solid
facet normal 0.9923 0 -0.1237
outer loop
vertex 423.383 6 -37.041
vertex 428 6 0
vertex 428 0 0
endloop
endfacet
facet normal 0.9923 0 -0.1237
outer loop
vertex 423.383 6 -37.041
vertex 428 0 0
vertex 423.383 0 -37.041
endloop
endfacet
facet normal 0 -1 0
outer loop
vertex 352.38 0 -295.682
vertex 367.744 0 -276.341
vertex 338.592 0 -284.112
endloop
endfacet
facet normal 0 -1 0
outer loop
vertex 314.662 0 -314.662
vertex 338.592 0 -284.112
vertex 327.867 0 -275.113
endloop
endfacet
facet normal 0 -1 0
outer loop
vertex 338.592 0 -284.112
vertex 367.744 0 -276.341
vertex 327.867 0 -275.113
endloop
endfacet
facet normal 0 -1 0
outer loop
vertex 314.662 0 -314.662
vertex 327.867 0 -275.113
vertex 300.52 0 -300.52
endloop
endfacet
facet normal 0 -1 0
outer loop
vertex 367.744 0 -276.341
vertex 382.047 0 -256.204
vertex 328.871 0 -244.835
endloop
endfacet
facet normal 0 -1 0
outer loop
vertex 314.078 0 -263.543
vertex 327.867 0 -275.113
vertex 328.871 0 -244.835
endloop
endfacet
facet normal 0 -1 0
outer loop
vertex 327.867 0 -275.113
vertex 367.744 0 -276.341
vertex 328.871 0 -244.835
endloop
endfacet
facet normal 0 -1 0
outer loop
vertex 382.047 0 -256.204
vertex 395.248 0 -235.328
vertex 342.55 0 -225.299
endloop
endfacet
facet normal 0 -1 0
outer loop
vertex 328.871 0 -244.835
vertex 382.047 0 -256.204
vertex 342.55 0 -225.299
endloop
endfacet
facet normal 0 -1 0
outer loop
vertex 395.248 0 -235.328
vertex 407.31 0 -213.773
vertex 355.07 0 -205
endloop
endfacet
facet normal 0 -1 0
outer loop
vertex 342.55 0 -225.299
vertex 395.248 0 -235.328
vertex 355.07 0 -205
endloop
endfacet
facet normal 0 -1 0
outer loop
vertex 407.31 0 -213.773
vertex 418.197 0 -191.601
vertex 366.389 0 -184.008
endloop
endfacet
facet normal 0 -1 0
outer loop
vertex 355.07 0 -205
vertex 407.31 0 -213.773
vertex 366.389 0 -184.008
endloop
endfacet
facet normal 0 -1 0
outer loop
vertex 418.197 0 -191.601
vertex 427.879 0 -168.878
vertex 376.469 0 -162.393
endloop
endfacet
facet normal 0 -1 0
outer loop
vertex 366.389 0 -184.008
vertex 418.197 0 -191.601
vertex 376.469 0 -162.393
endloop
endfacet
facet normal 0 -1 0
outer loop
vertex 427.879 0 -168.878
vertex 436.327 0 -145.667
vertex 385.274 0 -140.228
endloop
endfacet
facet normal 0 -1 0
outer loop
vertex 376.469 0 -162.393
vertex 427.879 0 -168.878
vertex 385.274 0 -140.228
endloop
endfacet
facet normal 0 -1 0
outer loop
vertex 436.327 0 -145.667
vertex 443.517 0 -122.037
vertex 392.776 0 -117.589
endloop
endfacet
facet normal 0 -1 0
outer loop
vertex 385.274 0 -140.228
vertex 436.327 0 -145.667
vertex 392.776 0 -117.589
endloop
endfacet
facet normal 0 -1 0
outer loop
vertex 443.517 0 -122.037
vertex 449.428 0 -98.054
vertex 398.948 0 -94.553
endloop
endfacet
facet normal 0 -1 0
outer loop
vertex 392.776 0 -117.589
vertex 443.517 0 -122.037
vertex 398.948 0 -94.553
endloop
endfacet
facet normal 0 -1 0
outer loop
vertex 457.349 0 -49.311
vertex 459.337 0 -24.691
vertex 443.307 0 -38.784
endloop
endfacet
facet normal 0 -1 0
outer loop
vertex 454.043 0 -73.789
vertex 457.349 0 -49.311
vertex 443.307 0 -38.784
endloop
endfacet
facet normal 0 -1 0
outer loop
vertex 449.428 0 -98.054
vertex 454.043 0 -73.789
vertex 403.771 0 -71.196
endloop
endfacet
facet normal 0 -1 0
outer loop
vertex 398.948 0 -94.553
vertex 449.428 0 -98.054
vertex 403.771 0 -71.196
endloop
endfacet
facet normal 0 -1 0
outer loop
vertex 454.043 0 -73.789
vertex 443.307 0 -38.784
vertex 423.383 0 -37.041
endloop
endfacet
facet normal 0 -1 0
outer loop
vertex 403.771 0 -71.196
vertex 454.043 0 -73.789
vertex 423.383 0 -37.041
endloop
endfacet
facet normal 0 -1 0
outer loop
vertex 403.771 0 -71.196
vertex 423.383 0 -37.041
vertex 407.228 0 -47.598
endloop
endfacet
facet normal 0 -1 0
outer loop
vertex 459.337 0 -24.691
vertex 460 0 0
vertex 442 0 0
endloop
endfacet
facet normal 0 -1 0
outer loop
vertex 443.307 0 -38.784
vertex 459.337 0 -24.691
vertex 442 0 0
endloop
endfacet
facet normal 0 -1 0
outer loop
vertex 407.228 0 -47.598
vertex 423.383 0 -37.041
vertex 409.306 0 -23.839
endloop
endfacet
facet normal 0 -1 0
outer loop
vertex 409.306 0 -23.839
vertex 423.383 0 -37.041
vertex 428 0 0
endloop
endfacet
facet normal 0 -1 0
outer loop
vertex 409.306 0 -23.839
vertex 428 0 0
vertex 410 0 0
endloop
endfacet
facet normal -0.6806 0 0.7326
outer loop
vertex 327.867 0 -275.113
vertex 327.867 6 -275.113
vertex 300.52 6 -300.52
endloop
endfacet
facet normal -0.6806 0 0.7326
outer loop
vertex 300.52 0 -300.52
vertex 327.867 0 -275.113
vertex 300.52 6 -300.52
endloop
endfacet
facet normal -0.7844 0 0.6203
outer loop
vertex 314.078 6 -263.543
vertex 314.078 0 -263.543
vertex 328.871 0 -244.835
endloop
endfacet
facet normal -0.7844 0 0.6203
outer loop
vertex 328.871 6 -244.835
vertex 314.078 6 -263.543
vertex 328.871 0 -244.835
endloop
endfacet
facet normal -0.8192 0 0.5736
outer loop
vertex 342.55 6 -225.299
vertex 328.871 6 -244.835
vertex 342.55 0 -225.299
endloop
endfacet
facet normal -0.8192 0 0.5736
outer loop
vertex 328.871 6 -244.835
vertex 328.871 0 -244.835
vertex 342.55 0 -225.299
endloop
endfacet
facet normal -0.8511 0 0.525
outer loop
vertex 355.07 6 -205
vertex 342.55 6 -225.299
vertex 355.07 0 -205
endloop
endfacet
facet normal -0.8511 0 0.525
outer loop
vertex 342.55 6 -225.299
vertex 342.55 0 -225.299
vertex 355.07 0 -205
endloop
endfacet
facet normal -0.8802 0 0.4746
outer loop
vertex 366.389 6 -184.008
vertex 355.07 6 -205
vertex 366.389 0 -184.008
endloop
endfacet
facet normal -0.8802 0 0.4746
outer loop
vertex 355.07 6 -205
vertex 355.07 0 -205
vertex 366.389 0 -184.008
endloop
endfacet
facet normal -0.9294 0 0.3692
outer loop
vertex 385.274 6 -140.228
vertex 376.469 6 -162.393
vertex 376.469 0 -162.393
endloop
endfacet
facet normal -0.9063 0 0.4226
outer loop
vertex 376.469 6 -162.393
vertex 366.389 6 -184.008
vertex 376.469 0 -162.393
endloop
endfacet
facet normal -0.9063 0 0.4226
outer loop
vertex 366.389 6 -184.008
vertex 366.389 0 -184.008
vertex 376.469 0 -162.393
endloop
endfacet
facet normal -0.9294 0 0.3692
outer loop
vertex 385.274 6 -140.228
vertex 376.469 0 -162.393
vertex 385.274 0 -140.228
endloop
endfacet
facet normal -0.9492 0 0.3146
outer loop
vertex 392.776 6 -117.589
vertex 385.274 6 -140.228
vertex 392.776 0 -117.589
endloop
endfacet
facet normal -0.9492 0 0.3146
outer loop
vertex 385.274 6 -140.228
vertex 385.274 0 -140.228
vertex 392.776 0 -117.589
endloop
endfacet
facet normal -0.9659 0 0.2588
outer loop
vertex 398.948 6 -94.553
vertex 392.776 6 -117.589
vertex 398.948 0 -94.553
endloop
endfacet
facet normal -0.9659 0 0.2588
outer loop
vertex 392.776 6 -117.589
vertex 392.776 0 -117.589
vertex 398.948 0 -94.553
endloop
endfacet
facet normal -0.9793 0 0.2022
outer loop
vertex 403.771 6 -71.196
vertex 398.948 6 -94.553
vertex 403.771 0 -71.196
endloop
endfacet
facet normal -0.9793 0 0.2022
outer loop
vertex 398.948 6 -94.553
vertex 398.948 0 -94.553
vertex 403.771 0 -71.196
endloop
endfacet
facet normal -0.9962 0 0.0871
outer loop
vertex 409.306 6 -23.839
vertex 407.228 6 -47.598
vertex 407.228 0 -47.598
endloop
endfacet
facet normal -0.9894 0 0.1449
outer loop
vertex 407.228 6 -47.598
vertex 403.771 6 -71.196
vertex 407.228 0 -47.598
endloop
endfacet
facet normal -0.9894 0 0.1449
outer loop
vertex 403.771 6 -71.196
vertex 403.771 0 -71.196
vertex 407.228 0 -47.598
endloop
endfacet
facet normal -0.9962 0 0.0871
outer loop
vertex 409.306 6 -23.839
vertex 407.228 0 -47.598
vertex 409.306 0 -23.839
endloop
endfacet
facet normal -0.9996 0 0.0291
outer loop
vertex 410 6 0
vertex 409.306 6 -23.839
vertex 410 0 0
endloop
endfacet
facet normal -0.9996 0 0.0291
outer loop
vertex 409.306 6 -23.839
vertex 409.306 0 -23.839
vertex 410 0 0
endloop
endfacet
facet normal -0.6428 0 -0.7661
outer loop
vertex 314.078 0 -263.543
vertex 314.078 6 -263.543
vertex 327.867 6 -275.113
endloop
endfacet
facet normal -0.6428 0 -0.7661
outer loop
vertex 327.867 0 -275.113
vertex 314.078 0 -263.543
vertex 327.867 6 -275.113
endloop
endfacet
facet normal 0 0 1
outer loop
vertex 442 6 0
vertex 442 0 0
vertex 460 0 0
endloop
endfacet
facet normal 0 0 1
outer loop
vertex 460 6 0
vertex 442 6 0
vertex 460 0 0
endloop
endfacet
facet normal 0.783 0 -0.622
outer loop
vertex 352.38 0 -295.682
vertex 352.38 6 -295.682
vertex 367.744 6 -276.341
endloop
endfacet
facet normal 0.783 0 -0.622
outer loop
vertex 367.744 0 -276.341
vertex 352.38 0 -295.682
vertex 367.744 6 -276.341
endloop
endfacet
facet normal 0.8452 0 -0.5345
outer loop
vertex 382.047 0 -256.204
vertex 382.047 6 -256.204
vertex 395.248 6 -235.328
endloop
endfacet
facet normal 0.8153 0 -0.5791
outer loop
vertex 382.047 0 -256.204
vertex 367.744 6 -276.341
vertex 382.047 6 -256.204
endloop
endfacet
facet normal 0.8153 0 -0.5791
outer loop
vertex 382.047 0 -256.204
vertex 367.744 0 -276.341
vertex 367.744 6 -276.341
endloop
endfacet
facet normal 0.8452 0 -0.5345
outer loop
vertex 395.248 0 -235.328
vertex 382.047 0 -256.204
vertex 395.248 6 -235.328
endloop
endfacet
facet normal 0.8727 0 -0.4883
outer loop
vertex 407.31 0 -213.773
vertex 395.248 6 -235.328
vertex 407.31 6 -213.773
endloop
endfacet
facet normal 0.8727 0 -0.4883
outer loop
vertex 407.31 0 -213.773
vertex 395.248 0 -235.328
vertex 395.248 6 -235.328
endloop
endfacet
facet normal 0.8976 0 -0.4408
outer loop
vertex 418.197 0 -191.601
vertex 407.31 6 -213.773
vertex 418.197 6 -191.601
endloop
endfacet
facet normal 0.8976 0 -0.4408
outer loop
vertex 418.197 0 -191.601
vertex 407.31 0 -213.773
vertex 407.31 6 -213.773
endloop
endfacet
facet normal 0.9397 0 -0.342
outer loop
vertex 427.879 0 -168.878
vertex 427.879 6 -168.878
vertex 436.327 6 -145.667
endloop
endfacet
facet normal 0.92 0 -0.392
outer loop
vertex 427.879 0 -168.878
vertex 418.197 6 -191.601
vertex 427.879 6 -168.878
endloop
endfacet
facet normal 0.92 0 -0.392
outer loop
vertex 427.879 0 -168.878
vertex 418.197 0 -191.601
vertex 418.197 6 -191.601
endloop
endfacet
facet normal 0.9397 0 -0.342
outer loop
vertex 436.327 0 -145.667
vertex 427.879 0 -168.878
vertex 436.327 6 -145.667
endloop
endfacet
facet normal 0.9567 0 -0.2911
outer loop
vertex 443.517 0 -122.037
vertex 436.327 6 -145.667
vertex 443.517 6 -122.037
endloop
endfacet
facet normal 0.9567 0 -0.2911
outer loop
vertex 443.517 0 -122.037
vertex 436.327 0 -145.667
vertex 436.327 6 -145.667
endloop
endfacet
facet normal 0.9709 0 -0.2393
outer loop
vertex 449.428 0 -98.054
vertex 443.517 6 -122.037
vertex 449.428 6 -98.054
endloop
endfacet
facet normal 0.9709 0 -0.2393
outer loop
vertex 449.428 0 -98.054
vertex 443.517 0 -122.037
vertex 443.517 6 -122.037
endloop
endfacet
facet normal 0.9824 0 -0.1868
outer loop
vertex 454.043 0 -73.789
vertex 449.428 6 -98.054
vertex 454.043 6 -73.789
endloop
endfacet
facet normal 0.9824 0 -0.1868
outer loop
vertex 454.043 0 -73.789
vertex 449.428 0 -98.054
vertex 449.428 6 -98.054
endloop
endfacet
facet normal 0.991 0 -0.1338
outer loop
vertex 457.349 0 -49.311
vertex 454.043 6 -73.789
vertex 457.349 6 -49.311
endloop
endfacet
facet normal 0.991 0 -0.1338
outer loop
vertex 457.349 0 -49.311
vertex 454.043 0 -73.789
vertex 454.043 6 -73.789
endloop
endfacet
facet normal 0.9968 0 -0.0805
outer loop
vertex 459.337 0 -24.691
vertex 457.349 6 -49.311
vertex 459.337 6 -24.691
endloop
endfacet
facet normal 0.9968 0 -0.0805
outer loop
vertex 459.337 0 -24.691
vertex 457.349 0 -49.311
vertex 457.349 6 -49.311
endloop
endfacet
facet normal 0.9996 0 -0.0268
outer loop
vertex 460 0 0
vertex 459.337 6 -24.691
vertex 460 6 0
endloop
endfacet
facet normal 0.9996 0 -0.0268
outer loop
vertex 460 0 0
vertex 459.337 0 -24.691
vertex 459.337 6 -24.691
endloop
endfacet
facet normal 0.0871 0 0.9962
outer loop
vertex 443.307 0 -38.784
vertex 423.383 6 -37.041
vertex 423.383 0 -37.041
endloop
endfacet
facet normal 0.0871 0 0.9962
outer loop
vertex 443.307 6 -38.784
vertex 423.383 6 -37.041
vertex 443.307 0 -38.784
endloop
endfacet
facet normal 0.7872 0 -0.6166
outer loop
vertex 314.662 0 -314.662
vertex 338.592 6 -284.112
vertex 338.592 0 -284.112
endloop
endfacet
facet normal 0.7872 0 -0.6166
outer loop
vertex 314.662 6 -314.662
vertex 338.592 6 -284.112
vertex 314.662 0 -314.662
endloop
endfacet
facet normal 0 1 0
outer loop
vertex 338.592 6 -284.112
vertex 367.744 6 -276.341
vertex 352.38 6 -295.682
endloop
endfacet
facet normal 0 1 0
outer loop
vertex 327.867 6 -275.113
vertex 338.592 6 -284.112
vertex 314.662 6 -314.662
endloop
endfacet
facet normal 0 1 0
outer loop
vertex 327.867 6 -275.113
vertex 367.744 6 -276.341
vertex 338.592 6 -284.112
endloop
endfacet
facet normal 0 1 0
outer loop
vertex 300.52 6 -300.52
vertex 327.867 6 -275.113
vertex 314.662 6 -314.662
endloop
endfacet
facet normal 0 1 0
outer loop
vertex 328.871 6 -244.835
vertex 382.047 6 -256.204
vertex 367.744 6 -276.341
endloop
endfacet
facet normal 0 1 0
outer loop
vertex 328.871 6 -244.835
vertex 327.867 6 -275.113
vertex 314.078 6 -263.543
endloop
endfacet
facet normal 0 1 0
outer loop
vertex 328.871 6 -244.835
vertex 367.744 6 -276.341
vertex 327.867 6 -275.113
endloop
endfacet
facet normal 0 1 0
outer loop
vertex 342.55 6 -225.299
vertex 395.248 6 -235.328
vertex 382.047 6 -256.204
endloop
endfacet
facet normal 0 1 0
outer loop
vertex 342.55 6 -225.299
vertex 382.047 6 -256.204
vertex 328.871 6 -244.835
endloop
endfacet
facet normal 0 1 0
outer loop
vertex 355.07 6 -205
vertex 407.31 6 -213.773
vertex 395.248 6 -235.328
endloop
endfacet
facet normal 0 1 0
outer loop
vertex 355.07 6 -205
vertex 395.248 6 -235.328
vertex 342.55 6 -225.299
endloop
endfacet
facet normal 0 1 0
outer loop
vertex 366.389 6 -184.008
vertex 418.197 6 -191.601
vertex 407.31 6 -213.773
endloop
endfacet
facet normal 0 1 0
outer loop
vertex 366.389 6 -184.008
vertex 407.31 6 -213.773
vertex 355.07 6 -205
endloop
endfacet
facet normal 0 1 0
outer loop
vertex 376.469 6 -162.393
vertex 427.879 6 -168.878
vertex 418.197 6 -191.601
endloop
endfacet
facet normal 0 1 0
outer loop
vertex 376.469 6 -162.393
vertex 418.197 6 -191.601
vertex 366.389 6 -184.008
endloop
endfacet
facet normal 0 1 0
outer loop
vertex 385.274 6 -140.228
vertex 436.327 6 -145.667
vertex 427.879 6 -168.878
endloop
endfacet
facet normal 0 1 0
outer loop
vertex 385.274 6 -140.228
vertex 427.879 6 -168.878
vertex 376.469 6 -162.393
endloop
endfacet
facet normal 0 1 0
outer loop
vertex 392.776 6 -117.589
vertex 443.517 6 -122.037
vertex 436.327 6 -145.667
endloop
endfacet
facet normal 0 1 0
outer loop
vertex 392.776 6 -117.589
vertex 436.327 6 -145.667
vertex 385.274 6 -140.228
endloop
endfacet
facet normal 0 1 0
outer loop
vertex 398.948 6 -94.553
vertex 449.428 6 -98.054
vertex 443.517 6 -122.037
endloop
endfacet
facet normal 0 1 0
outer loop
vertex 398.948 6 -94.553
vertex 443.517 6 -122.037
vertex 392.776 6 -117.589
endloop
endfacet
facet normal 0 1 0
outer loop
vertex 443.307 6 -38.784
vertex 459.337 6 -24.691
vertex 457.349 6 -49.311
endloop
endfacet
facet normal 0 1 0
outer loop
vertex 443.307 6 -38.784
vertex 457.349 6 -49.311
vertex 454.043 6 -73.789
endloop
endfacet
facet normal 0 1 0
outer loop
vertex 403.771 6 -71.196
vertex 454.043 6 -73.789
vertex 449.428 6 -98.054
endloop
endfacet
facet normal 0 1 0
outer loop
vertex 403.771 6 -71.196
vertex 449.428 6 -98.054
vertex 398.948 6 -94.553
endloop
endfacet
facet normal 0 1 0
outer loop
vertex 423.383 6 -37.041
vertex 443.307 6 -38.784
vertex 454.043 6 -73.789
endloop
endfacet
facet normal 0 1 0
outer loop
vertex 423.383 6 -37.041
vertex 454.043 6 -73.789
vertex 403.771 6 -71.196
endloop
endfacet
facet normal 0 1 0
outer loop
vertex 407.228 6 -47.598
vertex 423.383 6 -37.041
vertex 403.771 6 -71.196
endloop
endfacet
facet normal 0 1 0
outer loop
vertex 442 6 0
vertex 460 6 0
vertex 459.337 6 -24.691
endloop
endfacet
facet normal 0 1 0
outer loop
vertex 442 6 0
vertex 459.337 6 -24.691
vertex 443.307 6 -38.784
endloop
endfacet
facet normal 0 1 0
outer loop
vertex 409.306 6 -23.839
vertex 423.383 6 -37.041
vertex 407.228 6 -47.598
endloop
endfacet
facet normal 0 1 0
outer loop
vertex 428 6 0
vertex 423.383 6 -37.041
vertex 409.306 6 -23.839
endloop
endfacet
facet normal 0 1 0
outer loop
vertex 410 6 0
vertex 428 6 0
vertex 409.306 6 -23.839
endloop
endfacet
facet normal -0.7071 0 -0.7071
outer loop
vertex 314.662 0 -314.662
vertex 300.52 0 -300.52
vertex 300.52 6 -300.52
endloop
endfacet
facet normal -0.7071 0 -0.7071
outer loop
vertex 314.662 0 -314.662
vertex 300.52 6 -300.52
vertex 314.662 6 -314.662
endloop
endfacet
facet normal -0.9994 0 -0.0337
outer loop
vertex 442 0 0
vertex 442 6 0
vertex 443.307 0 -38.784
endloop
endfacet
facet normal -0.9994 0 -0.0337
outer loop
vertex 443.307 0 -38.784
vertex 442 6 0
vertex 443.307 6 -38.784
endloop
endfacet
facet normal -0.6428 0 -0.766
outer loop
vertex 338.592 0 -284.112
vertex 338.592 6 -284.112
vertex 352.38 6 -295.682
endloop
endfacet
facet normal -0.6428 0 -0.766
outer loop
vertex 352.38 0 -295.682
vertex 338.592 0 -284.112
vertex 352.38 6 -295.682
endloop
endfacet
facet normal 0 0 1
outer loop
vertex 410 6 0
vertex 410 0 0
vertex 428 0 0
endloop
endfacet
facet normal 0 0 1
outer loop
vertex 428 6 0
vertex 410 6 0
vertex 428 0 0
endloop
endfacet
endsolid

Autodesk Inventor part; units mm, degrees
ref_plane "YZ Plane" through (0, 0, 0) normal (1, 0, 0) x (0, 1, 0)
ref_plane "XZ Plane" through (0, 0, 0) normal (0, 1, 0) x (-1, 0, 0)
ref_plane "XY Plane" through (0, 0, 0) normal (0, 0, 1) x (1, 0, 0)
sketch "Esboço1" plane through (0, 0, 0) normal (0, 1, 0) x (-1, 0, 0)
  arc A0 (-410, 0) -> (-289.9138, -289.9138) centre (0, 0) ccw
  arc A1 (-460, 0) -> (-325.2691, -325.2691) centre (0, 0) ccw
  circle A2 centre (0, 0) radius 460
  circle A3 centre (0, 0) radius 410
  line L0 (0, 0) -> (-407.9373, -407.9373)
  line L1 (0, 0) -> (-1224.3013, 0) construction
  line L2 (-410, 0) -> (-460, 0)
  point P0 (-460, 0)
  point P1 (-325.2691, -325.2691)
  point P2 (-289.9138, -289.9138)
  dimension "d27" = 820
  dimension "d28" = 920
  dimension "d87" = 45
extrude "Extrusão1" add sketch "Esboço1" along normal blind 6 contours A0 L0 A1 L2
sketch "Esboço6" plane through (0, 6, 0) normal (0, 1, 0) x (1, 0, 0)
  arc A0 (460, 0) -> (325.2691, 325.2691) centre (0, 0) ccw projected
  circle A1 centre (0, 0) radius 460
  arc A2 (410, 0) -> (289.9138, 289.9138) centre (0, 0) ccw projected
  circle A3 centre (0, 0) radius 410
  line L0 (0, 0) -> (743.005, 65.0045)
  line L1 (410, 0) -> (460, 0) projected
  line L2 (410, 0) -> (428, 0)
  line L3 (428, 0) -> (442, 0)
  line L4 (408.4398, 35.7339) -> (423.3827, 37.0412)
  line L5 (423.3827, 37.0412) -> (443.3066, 38.7843)
  line L6 (428, 0) -> (423.3827, 37.0412)
  line L7 (442, 0) -> (443.3066, 38.7843)
  dimension "d110" = -5
  dimension "d111" = 18
  dimension "d112" = 14
  dimension "d113" = 15
  dimension "d114" = 20
extrude "Extrusão6" cut sketch "Esboço6" against normal up to surface (6 mm away) contours L1 L6 L0 L7
sketch "Esboço8" plane through (0, 6, 0) normal (0, 1, 0) x (1, 0, 0)
  arc A0 (325.2691, 325.2691) -> (352.3804, 295.6823) centre (0, 0) ccw
  arc A1 (289.9138, 289.9138) -> (314.0782, 263.5429) centre (0, 0) ccw
  line L0 (0, 0) -> (489.696, 410.9037)
  line L1 (325.2691, 325.2691) -> (289.9138, 289.9138) projected
  line L2 (325.2691, 325.2691) -> (314.6625, 314.6625)
  line L3 (314.6625, 314.6625) -> (300.5204, 300.5204)
  line L4 (352.3804, 295.6823) -> (338.5916, 284.1121)
  line L5 (338.5916, 284.1121) -> (327.867, 275.1131)
  line L6 (327.867, 275.1131) -> (300.5204, 300.5204)
  line L7 (338.5916, 284.1121) -> (314.6625, 314.6625)
  circle A2 centre (0, 0) radius 460
  circle A3 centre (0, 0) radius 410
  point P0 (314.0782, 263.5429)
  point P1 (352.3804, 295.6823)
  point P2 (325.2691, 325.2691)
  dimension "d130" = -5
  dimension "d131" = 15
  dimension "d132" = 20
  dimension "d133" = 18
  dimension "d134" = 14
extrude "Extrusão7" cut sketch "Esboço8" against normal up to surface (6 mm away) contours A2 L0 L7 L1 | L6 L0 A3 L1
equation "\"Raio_vergadura\" = Espessura"
equation "\"Largura_alívio_de_vergadura\" = Espessura"
equation "\"Profundidade_alívio_de_vergadura\" = 0.5 * Espessura"
equation "\"Tamanho_alívio_de_dobra\" = 4 * Espessura"
equation "\"Remanescente_mínimo\" = 2 * Espessura"
equation "\"Raiodetransição\" = Raio_vergadura"
equation "\"Tamanho_de_raio_de_Jacobi\" = Raio_vergadura"
equation "\"TamanhoFolga\" = Espessura"
equation "\"Espessura\" = 3.048"
properties part number "base"
